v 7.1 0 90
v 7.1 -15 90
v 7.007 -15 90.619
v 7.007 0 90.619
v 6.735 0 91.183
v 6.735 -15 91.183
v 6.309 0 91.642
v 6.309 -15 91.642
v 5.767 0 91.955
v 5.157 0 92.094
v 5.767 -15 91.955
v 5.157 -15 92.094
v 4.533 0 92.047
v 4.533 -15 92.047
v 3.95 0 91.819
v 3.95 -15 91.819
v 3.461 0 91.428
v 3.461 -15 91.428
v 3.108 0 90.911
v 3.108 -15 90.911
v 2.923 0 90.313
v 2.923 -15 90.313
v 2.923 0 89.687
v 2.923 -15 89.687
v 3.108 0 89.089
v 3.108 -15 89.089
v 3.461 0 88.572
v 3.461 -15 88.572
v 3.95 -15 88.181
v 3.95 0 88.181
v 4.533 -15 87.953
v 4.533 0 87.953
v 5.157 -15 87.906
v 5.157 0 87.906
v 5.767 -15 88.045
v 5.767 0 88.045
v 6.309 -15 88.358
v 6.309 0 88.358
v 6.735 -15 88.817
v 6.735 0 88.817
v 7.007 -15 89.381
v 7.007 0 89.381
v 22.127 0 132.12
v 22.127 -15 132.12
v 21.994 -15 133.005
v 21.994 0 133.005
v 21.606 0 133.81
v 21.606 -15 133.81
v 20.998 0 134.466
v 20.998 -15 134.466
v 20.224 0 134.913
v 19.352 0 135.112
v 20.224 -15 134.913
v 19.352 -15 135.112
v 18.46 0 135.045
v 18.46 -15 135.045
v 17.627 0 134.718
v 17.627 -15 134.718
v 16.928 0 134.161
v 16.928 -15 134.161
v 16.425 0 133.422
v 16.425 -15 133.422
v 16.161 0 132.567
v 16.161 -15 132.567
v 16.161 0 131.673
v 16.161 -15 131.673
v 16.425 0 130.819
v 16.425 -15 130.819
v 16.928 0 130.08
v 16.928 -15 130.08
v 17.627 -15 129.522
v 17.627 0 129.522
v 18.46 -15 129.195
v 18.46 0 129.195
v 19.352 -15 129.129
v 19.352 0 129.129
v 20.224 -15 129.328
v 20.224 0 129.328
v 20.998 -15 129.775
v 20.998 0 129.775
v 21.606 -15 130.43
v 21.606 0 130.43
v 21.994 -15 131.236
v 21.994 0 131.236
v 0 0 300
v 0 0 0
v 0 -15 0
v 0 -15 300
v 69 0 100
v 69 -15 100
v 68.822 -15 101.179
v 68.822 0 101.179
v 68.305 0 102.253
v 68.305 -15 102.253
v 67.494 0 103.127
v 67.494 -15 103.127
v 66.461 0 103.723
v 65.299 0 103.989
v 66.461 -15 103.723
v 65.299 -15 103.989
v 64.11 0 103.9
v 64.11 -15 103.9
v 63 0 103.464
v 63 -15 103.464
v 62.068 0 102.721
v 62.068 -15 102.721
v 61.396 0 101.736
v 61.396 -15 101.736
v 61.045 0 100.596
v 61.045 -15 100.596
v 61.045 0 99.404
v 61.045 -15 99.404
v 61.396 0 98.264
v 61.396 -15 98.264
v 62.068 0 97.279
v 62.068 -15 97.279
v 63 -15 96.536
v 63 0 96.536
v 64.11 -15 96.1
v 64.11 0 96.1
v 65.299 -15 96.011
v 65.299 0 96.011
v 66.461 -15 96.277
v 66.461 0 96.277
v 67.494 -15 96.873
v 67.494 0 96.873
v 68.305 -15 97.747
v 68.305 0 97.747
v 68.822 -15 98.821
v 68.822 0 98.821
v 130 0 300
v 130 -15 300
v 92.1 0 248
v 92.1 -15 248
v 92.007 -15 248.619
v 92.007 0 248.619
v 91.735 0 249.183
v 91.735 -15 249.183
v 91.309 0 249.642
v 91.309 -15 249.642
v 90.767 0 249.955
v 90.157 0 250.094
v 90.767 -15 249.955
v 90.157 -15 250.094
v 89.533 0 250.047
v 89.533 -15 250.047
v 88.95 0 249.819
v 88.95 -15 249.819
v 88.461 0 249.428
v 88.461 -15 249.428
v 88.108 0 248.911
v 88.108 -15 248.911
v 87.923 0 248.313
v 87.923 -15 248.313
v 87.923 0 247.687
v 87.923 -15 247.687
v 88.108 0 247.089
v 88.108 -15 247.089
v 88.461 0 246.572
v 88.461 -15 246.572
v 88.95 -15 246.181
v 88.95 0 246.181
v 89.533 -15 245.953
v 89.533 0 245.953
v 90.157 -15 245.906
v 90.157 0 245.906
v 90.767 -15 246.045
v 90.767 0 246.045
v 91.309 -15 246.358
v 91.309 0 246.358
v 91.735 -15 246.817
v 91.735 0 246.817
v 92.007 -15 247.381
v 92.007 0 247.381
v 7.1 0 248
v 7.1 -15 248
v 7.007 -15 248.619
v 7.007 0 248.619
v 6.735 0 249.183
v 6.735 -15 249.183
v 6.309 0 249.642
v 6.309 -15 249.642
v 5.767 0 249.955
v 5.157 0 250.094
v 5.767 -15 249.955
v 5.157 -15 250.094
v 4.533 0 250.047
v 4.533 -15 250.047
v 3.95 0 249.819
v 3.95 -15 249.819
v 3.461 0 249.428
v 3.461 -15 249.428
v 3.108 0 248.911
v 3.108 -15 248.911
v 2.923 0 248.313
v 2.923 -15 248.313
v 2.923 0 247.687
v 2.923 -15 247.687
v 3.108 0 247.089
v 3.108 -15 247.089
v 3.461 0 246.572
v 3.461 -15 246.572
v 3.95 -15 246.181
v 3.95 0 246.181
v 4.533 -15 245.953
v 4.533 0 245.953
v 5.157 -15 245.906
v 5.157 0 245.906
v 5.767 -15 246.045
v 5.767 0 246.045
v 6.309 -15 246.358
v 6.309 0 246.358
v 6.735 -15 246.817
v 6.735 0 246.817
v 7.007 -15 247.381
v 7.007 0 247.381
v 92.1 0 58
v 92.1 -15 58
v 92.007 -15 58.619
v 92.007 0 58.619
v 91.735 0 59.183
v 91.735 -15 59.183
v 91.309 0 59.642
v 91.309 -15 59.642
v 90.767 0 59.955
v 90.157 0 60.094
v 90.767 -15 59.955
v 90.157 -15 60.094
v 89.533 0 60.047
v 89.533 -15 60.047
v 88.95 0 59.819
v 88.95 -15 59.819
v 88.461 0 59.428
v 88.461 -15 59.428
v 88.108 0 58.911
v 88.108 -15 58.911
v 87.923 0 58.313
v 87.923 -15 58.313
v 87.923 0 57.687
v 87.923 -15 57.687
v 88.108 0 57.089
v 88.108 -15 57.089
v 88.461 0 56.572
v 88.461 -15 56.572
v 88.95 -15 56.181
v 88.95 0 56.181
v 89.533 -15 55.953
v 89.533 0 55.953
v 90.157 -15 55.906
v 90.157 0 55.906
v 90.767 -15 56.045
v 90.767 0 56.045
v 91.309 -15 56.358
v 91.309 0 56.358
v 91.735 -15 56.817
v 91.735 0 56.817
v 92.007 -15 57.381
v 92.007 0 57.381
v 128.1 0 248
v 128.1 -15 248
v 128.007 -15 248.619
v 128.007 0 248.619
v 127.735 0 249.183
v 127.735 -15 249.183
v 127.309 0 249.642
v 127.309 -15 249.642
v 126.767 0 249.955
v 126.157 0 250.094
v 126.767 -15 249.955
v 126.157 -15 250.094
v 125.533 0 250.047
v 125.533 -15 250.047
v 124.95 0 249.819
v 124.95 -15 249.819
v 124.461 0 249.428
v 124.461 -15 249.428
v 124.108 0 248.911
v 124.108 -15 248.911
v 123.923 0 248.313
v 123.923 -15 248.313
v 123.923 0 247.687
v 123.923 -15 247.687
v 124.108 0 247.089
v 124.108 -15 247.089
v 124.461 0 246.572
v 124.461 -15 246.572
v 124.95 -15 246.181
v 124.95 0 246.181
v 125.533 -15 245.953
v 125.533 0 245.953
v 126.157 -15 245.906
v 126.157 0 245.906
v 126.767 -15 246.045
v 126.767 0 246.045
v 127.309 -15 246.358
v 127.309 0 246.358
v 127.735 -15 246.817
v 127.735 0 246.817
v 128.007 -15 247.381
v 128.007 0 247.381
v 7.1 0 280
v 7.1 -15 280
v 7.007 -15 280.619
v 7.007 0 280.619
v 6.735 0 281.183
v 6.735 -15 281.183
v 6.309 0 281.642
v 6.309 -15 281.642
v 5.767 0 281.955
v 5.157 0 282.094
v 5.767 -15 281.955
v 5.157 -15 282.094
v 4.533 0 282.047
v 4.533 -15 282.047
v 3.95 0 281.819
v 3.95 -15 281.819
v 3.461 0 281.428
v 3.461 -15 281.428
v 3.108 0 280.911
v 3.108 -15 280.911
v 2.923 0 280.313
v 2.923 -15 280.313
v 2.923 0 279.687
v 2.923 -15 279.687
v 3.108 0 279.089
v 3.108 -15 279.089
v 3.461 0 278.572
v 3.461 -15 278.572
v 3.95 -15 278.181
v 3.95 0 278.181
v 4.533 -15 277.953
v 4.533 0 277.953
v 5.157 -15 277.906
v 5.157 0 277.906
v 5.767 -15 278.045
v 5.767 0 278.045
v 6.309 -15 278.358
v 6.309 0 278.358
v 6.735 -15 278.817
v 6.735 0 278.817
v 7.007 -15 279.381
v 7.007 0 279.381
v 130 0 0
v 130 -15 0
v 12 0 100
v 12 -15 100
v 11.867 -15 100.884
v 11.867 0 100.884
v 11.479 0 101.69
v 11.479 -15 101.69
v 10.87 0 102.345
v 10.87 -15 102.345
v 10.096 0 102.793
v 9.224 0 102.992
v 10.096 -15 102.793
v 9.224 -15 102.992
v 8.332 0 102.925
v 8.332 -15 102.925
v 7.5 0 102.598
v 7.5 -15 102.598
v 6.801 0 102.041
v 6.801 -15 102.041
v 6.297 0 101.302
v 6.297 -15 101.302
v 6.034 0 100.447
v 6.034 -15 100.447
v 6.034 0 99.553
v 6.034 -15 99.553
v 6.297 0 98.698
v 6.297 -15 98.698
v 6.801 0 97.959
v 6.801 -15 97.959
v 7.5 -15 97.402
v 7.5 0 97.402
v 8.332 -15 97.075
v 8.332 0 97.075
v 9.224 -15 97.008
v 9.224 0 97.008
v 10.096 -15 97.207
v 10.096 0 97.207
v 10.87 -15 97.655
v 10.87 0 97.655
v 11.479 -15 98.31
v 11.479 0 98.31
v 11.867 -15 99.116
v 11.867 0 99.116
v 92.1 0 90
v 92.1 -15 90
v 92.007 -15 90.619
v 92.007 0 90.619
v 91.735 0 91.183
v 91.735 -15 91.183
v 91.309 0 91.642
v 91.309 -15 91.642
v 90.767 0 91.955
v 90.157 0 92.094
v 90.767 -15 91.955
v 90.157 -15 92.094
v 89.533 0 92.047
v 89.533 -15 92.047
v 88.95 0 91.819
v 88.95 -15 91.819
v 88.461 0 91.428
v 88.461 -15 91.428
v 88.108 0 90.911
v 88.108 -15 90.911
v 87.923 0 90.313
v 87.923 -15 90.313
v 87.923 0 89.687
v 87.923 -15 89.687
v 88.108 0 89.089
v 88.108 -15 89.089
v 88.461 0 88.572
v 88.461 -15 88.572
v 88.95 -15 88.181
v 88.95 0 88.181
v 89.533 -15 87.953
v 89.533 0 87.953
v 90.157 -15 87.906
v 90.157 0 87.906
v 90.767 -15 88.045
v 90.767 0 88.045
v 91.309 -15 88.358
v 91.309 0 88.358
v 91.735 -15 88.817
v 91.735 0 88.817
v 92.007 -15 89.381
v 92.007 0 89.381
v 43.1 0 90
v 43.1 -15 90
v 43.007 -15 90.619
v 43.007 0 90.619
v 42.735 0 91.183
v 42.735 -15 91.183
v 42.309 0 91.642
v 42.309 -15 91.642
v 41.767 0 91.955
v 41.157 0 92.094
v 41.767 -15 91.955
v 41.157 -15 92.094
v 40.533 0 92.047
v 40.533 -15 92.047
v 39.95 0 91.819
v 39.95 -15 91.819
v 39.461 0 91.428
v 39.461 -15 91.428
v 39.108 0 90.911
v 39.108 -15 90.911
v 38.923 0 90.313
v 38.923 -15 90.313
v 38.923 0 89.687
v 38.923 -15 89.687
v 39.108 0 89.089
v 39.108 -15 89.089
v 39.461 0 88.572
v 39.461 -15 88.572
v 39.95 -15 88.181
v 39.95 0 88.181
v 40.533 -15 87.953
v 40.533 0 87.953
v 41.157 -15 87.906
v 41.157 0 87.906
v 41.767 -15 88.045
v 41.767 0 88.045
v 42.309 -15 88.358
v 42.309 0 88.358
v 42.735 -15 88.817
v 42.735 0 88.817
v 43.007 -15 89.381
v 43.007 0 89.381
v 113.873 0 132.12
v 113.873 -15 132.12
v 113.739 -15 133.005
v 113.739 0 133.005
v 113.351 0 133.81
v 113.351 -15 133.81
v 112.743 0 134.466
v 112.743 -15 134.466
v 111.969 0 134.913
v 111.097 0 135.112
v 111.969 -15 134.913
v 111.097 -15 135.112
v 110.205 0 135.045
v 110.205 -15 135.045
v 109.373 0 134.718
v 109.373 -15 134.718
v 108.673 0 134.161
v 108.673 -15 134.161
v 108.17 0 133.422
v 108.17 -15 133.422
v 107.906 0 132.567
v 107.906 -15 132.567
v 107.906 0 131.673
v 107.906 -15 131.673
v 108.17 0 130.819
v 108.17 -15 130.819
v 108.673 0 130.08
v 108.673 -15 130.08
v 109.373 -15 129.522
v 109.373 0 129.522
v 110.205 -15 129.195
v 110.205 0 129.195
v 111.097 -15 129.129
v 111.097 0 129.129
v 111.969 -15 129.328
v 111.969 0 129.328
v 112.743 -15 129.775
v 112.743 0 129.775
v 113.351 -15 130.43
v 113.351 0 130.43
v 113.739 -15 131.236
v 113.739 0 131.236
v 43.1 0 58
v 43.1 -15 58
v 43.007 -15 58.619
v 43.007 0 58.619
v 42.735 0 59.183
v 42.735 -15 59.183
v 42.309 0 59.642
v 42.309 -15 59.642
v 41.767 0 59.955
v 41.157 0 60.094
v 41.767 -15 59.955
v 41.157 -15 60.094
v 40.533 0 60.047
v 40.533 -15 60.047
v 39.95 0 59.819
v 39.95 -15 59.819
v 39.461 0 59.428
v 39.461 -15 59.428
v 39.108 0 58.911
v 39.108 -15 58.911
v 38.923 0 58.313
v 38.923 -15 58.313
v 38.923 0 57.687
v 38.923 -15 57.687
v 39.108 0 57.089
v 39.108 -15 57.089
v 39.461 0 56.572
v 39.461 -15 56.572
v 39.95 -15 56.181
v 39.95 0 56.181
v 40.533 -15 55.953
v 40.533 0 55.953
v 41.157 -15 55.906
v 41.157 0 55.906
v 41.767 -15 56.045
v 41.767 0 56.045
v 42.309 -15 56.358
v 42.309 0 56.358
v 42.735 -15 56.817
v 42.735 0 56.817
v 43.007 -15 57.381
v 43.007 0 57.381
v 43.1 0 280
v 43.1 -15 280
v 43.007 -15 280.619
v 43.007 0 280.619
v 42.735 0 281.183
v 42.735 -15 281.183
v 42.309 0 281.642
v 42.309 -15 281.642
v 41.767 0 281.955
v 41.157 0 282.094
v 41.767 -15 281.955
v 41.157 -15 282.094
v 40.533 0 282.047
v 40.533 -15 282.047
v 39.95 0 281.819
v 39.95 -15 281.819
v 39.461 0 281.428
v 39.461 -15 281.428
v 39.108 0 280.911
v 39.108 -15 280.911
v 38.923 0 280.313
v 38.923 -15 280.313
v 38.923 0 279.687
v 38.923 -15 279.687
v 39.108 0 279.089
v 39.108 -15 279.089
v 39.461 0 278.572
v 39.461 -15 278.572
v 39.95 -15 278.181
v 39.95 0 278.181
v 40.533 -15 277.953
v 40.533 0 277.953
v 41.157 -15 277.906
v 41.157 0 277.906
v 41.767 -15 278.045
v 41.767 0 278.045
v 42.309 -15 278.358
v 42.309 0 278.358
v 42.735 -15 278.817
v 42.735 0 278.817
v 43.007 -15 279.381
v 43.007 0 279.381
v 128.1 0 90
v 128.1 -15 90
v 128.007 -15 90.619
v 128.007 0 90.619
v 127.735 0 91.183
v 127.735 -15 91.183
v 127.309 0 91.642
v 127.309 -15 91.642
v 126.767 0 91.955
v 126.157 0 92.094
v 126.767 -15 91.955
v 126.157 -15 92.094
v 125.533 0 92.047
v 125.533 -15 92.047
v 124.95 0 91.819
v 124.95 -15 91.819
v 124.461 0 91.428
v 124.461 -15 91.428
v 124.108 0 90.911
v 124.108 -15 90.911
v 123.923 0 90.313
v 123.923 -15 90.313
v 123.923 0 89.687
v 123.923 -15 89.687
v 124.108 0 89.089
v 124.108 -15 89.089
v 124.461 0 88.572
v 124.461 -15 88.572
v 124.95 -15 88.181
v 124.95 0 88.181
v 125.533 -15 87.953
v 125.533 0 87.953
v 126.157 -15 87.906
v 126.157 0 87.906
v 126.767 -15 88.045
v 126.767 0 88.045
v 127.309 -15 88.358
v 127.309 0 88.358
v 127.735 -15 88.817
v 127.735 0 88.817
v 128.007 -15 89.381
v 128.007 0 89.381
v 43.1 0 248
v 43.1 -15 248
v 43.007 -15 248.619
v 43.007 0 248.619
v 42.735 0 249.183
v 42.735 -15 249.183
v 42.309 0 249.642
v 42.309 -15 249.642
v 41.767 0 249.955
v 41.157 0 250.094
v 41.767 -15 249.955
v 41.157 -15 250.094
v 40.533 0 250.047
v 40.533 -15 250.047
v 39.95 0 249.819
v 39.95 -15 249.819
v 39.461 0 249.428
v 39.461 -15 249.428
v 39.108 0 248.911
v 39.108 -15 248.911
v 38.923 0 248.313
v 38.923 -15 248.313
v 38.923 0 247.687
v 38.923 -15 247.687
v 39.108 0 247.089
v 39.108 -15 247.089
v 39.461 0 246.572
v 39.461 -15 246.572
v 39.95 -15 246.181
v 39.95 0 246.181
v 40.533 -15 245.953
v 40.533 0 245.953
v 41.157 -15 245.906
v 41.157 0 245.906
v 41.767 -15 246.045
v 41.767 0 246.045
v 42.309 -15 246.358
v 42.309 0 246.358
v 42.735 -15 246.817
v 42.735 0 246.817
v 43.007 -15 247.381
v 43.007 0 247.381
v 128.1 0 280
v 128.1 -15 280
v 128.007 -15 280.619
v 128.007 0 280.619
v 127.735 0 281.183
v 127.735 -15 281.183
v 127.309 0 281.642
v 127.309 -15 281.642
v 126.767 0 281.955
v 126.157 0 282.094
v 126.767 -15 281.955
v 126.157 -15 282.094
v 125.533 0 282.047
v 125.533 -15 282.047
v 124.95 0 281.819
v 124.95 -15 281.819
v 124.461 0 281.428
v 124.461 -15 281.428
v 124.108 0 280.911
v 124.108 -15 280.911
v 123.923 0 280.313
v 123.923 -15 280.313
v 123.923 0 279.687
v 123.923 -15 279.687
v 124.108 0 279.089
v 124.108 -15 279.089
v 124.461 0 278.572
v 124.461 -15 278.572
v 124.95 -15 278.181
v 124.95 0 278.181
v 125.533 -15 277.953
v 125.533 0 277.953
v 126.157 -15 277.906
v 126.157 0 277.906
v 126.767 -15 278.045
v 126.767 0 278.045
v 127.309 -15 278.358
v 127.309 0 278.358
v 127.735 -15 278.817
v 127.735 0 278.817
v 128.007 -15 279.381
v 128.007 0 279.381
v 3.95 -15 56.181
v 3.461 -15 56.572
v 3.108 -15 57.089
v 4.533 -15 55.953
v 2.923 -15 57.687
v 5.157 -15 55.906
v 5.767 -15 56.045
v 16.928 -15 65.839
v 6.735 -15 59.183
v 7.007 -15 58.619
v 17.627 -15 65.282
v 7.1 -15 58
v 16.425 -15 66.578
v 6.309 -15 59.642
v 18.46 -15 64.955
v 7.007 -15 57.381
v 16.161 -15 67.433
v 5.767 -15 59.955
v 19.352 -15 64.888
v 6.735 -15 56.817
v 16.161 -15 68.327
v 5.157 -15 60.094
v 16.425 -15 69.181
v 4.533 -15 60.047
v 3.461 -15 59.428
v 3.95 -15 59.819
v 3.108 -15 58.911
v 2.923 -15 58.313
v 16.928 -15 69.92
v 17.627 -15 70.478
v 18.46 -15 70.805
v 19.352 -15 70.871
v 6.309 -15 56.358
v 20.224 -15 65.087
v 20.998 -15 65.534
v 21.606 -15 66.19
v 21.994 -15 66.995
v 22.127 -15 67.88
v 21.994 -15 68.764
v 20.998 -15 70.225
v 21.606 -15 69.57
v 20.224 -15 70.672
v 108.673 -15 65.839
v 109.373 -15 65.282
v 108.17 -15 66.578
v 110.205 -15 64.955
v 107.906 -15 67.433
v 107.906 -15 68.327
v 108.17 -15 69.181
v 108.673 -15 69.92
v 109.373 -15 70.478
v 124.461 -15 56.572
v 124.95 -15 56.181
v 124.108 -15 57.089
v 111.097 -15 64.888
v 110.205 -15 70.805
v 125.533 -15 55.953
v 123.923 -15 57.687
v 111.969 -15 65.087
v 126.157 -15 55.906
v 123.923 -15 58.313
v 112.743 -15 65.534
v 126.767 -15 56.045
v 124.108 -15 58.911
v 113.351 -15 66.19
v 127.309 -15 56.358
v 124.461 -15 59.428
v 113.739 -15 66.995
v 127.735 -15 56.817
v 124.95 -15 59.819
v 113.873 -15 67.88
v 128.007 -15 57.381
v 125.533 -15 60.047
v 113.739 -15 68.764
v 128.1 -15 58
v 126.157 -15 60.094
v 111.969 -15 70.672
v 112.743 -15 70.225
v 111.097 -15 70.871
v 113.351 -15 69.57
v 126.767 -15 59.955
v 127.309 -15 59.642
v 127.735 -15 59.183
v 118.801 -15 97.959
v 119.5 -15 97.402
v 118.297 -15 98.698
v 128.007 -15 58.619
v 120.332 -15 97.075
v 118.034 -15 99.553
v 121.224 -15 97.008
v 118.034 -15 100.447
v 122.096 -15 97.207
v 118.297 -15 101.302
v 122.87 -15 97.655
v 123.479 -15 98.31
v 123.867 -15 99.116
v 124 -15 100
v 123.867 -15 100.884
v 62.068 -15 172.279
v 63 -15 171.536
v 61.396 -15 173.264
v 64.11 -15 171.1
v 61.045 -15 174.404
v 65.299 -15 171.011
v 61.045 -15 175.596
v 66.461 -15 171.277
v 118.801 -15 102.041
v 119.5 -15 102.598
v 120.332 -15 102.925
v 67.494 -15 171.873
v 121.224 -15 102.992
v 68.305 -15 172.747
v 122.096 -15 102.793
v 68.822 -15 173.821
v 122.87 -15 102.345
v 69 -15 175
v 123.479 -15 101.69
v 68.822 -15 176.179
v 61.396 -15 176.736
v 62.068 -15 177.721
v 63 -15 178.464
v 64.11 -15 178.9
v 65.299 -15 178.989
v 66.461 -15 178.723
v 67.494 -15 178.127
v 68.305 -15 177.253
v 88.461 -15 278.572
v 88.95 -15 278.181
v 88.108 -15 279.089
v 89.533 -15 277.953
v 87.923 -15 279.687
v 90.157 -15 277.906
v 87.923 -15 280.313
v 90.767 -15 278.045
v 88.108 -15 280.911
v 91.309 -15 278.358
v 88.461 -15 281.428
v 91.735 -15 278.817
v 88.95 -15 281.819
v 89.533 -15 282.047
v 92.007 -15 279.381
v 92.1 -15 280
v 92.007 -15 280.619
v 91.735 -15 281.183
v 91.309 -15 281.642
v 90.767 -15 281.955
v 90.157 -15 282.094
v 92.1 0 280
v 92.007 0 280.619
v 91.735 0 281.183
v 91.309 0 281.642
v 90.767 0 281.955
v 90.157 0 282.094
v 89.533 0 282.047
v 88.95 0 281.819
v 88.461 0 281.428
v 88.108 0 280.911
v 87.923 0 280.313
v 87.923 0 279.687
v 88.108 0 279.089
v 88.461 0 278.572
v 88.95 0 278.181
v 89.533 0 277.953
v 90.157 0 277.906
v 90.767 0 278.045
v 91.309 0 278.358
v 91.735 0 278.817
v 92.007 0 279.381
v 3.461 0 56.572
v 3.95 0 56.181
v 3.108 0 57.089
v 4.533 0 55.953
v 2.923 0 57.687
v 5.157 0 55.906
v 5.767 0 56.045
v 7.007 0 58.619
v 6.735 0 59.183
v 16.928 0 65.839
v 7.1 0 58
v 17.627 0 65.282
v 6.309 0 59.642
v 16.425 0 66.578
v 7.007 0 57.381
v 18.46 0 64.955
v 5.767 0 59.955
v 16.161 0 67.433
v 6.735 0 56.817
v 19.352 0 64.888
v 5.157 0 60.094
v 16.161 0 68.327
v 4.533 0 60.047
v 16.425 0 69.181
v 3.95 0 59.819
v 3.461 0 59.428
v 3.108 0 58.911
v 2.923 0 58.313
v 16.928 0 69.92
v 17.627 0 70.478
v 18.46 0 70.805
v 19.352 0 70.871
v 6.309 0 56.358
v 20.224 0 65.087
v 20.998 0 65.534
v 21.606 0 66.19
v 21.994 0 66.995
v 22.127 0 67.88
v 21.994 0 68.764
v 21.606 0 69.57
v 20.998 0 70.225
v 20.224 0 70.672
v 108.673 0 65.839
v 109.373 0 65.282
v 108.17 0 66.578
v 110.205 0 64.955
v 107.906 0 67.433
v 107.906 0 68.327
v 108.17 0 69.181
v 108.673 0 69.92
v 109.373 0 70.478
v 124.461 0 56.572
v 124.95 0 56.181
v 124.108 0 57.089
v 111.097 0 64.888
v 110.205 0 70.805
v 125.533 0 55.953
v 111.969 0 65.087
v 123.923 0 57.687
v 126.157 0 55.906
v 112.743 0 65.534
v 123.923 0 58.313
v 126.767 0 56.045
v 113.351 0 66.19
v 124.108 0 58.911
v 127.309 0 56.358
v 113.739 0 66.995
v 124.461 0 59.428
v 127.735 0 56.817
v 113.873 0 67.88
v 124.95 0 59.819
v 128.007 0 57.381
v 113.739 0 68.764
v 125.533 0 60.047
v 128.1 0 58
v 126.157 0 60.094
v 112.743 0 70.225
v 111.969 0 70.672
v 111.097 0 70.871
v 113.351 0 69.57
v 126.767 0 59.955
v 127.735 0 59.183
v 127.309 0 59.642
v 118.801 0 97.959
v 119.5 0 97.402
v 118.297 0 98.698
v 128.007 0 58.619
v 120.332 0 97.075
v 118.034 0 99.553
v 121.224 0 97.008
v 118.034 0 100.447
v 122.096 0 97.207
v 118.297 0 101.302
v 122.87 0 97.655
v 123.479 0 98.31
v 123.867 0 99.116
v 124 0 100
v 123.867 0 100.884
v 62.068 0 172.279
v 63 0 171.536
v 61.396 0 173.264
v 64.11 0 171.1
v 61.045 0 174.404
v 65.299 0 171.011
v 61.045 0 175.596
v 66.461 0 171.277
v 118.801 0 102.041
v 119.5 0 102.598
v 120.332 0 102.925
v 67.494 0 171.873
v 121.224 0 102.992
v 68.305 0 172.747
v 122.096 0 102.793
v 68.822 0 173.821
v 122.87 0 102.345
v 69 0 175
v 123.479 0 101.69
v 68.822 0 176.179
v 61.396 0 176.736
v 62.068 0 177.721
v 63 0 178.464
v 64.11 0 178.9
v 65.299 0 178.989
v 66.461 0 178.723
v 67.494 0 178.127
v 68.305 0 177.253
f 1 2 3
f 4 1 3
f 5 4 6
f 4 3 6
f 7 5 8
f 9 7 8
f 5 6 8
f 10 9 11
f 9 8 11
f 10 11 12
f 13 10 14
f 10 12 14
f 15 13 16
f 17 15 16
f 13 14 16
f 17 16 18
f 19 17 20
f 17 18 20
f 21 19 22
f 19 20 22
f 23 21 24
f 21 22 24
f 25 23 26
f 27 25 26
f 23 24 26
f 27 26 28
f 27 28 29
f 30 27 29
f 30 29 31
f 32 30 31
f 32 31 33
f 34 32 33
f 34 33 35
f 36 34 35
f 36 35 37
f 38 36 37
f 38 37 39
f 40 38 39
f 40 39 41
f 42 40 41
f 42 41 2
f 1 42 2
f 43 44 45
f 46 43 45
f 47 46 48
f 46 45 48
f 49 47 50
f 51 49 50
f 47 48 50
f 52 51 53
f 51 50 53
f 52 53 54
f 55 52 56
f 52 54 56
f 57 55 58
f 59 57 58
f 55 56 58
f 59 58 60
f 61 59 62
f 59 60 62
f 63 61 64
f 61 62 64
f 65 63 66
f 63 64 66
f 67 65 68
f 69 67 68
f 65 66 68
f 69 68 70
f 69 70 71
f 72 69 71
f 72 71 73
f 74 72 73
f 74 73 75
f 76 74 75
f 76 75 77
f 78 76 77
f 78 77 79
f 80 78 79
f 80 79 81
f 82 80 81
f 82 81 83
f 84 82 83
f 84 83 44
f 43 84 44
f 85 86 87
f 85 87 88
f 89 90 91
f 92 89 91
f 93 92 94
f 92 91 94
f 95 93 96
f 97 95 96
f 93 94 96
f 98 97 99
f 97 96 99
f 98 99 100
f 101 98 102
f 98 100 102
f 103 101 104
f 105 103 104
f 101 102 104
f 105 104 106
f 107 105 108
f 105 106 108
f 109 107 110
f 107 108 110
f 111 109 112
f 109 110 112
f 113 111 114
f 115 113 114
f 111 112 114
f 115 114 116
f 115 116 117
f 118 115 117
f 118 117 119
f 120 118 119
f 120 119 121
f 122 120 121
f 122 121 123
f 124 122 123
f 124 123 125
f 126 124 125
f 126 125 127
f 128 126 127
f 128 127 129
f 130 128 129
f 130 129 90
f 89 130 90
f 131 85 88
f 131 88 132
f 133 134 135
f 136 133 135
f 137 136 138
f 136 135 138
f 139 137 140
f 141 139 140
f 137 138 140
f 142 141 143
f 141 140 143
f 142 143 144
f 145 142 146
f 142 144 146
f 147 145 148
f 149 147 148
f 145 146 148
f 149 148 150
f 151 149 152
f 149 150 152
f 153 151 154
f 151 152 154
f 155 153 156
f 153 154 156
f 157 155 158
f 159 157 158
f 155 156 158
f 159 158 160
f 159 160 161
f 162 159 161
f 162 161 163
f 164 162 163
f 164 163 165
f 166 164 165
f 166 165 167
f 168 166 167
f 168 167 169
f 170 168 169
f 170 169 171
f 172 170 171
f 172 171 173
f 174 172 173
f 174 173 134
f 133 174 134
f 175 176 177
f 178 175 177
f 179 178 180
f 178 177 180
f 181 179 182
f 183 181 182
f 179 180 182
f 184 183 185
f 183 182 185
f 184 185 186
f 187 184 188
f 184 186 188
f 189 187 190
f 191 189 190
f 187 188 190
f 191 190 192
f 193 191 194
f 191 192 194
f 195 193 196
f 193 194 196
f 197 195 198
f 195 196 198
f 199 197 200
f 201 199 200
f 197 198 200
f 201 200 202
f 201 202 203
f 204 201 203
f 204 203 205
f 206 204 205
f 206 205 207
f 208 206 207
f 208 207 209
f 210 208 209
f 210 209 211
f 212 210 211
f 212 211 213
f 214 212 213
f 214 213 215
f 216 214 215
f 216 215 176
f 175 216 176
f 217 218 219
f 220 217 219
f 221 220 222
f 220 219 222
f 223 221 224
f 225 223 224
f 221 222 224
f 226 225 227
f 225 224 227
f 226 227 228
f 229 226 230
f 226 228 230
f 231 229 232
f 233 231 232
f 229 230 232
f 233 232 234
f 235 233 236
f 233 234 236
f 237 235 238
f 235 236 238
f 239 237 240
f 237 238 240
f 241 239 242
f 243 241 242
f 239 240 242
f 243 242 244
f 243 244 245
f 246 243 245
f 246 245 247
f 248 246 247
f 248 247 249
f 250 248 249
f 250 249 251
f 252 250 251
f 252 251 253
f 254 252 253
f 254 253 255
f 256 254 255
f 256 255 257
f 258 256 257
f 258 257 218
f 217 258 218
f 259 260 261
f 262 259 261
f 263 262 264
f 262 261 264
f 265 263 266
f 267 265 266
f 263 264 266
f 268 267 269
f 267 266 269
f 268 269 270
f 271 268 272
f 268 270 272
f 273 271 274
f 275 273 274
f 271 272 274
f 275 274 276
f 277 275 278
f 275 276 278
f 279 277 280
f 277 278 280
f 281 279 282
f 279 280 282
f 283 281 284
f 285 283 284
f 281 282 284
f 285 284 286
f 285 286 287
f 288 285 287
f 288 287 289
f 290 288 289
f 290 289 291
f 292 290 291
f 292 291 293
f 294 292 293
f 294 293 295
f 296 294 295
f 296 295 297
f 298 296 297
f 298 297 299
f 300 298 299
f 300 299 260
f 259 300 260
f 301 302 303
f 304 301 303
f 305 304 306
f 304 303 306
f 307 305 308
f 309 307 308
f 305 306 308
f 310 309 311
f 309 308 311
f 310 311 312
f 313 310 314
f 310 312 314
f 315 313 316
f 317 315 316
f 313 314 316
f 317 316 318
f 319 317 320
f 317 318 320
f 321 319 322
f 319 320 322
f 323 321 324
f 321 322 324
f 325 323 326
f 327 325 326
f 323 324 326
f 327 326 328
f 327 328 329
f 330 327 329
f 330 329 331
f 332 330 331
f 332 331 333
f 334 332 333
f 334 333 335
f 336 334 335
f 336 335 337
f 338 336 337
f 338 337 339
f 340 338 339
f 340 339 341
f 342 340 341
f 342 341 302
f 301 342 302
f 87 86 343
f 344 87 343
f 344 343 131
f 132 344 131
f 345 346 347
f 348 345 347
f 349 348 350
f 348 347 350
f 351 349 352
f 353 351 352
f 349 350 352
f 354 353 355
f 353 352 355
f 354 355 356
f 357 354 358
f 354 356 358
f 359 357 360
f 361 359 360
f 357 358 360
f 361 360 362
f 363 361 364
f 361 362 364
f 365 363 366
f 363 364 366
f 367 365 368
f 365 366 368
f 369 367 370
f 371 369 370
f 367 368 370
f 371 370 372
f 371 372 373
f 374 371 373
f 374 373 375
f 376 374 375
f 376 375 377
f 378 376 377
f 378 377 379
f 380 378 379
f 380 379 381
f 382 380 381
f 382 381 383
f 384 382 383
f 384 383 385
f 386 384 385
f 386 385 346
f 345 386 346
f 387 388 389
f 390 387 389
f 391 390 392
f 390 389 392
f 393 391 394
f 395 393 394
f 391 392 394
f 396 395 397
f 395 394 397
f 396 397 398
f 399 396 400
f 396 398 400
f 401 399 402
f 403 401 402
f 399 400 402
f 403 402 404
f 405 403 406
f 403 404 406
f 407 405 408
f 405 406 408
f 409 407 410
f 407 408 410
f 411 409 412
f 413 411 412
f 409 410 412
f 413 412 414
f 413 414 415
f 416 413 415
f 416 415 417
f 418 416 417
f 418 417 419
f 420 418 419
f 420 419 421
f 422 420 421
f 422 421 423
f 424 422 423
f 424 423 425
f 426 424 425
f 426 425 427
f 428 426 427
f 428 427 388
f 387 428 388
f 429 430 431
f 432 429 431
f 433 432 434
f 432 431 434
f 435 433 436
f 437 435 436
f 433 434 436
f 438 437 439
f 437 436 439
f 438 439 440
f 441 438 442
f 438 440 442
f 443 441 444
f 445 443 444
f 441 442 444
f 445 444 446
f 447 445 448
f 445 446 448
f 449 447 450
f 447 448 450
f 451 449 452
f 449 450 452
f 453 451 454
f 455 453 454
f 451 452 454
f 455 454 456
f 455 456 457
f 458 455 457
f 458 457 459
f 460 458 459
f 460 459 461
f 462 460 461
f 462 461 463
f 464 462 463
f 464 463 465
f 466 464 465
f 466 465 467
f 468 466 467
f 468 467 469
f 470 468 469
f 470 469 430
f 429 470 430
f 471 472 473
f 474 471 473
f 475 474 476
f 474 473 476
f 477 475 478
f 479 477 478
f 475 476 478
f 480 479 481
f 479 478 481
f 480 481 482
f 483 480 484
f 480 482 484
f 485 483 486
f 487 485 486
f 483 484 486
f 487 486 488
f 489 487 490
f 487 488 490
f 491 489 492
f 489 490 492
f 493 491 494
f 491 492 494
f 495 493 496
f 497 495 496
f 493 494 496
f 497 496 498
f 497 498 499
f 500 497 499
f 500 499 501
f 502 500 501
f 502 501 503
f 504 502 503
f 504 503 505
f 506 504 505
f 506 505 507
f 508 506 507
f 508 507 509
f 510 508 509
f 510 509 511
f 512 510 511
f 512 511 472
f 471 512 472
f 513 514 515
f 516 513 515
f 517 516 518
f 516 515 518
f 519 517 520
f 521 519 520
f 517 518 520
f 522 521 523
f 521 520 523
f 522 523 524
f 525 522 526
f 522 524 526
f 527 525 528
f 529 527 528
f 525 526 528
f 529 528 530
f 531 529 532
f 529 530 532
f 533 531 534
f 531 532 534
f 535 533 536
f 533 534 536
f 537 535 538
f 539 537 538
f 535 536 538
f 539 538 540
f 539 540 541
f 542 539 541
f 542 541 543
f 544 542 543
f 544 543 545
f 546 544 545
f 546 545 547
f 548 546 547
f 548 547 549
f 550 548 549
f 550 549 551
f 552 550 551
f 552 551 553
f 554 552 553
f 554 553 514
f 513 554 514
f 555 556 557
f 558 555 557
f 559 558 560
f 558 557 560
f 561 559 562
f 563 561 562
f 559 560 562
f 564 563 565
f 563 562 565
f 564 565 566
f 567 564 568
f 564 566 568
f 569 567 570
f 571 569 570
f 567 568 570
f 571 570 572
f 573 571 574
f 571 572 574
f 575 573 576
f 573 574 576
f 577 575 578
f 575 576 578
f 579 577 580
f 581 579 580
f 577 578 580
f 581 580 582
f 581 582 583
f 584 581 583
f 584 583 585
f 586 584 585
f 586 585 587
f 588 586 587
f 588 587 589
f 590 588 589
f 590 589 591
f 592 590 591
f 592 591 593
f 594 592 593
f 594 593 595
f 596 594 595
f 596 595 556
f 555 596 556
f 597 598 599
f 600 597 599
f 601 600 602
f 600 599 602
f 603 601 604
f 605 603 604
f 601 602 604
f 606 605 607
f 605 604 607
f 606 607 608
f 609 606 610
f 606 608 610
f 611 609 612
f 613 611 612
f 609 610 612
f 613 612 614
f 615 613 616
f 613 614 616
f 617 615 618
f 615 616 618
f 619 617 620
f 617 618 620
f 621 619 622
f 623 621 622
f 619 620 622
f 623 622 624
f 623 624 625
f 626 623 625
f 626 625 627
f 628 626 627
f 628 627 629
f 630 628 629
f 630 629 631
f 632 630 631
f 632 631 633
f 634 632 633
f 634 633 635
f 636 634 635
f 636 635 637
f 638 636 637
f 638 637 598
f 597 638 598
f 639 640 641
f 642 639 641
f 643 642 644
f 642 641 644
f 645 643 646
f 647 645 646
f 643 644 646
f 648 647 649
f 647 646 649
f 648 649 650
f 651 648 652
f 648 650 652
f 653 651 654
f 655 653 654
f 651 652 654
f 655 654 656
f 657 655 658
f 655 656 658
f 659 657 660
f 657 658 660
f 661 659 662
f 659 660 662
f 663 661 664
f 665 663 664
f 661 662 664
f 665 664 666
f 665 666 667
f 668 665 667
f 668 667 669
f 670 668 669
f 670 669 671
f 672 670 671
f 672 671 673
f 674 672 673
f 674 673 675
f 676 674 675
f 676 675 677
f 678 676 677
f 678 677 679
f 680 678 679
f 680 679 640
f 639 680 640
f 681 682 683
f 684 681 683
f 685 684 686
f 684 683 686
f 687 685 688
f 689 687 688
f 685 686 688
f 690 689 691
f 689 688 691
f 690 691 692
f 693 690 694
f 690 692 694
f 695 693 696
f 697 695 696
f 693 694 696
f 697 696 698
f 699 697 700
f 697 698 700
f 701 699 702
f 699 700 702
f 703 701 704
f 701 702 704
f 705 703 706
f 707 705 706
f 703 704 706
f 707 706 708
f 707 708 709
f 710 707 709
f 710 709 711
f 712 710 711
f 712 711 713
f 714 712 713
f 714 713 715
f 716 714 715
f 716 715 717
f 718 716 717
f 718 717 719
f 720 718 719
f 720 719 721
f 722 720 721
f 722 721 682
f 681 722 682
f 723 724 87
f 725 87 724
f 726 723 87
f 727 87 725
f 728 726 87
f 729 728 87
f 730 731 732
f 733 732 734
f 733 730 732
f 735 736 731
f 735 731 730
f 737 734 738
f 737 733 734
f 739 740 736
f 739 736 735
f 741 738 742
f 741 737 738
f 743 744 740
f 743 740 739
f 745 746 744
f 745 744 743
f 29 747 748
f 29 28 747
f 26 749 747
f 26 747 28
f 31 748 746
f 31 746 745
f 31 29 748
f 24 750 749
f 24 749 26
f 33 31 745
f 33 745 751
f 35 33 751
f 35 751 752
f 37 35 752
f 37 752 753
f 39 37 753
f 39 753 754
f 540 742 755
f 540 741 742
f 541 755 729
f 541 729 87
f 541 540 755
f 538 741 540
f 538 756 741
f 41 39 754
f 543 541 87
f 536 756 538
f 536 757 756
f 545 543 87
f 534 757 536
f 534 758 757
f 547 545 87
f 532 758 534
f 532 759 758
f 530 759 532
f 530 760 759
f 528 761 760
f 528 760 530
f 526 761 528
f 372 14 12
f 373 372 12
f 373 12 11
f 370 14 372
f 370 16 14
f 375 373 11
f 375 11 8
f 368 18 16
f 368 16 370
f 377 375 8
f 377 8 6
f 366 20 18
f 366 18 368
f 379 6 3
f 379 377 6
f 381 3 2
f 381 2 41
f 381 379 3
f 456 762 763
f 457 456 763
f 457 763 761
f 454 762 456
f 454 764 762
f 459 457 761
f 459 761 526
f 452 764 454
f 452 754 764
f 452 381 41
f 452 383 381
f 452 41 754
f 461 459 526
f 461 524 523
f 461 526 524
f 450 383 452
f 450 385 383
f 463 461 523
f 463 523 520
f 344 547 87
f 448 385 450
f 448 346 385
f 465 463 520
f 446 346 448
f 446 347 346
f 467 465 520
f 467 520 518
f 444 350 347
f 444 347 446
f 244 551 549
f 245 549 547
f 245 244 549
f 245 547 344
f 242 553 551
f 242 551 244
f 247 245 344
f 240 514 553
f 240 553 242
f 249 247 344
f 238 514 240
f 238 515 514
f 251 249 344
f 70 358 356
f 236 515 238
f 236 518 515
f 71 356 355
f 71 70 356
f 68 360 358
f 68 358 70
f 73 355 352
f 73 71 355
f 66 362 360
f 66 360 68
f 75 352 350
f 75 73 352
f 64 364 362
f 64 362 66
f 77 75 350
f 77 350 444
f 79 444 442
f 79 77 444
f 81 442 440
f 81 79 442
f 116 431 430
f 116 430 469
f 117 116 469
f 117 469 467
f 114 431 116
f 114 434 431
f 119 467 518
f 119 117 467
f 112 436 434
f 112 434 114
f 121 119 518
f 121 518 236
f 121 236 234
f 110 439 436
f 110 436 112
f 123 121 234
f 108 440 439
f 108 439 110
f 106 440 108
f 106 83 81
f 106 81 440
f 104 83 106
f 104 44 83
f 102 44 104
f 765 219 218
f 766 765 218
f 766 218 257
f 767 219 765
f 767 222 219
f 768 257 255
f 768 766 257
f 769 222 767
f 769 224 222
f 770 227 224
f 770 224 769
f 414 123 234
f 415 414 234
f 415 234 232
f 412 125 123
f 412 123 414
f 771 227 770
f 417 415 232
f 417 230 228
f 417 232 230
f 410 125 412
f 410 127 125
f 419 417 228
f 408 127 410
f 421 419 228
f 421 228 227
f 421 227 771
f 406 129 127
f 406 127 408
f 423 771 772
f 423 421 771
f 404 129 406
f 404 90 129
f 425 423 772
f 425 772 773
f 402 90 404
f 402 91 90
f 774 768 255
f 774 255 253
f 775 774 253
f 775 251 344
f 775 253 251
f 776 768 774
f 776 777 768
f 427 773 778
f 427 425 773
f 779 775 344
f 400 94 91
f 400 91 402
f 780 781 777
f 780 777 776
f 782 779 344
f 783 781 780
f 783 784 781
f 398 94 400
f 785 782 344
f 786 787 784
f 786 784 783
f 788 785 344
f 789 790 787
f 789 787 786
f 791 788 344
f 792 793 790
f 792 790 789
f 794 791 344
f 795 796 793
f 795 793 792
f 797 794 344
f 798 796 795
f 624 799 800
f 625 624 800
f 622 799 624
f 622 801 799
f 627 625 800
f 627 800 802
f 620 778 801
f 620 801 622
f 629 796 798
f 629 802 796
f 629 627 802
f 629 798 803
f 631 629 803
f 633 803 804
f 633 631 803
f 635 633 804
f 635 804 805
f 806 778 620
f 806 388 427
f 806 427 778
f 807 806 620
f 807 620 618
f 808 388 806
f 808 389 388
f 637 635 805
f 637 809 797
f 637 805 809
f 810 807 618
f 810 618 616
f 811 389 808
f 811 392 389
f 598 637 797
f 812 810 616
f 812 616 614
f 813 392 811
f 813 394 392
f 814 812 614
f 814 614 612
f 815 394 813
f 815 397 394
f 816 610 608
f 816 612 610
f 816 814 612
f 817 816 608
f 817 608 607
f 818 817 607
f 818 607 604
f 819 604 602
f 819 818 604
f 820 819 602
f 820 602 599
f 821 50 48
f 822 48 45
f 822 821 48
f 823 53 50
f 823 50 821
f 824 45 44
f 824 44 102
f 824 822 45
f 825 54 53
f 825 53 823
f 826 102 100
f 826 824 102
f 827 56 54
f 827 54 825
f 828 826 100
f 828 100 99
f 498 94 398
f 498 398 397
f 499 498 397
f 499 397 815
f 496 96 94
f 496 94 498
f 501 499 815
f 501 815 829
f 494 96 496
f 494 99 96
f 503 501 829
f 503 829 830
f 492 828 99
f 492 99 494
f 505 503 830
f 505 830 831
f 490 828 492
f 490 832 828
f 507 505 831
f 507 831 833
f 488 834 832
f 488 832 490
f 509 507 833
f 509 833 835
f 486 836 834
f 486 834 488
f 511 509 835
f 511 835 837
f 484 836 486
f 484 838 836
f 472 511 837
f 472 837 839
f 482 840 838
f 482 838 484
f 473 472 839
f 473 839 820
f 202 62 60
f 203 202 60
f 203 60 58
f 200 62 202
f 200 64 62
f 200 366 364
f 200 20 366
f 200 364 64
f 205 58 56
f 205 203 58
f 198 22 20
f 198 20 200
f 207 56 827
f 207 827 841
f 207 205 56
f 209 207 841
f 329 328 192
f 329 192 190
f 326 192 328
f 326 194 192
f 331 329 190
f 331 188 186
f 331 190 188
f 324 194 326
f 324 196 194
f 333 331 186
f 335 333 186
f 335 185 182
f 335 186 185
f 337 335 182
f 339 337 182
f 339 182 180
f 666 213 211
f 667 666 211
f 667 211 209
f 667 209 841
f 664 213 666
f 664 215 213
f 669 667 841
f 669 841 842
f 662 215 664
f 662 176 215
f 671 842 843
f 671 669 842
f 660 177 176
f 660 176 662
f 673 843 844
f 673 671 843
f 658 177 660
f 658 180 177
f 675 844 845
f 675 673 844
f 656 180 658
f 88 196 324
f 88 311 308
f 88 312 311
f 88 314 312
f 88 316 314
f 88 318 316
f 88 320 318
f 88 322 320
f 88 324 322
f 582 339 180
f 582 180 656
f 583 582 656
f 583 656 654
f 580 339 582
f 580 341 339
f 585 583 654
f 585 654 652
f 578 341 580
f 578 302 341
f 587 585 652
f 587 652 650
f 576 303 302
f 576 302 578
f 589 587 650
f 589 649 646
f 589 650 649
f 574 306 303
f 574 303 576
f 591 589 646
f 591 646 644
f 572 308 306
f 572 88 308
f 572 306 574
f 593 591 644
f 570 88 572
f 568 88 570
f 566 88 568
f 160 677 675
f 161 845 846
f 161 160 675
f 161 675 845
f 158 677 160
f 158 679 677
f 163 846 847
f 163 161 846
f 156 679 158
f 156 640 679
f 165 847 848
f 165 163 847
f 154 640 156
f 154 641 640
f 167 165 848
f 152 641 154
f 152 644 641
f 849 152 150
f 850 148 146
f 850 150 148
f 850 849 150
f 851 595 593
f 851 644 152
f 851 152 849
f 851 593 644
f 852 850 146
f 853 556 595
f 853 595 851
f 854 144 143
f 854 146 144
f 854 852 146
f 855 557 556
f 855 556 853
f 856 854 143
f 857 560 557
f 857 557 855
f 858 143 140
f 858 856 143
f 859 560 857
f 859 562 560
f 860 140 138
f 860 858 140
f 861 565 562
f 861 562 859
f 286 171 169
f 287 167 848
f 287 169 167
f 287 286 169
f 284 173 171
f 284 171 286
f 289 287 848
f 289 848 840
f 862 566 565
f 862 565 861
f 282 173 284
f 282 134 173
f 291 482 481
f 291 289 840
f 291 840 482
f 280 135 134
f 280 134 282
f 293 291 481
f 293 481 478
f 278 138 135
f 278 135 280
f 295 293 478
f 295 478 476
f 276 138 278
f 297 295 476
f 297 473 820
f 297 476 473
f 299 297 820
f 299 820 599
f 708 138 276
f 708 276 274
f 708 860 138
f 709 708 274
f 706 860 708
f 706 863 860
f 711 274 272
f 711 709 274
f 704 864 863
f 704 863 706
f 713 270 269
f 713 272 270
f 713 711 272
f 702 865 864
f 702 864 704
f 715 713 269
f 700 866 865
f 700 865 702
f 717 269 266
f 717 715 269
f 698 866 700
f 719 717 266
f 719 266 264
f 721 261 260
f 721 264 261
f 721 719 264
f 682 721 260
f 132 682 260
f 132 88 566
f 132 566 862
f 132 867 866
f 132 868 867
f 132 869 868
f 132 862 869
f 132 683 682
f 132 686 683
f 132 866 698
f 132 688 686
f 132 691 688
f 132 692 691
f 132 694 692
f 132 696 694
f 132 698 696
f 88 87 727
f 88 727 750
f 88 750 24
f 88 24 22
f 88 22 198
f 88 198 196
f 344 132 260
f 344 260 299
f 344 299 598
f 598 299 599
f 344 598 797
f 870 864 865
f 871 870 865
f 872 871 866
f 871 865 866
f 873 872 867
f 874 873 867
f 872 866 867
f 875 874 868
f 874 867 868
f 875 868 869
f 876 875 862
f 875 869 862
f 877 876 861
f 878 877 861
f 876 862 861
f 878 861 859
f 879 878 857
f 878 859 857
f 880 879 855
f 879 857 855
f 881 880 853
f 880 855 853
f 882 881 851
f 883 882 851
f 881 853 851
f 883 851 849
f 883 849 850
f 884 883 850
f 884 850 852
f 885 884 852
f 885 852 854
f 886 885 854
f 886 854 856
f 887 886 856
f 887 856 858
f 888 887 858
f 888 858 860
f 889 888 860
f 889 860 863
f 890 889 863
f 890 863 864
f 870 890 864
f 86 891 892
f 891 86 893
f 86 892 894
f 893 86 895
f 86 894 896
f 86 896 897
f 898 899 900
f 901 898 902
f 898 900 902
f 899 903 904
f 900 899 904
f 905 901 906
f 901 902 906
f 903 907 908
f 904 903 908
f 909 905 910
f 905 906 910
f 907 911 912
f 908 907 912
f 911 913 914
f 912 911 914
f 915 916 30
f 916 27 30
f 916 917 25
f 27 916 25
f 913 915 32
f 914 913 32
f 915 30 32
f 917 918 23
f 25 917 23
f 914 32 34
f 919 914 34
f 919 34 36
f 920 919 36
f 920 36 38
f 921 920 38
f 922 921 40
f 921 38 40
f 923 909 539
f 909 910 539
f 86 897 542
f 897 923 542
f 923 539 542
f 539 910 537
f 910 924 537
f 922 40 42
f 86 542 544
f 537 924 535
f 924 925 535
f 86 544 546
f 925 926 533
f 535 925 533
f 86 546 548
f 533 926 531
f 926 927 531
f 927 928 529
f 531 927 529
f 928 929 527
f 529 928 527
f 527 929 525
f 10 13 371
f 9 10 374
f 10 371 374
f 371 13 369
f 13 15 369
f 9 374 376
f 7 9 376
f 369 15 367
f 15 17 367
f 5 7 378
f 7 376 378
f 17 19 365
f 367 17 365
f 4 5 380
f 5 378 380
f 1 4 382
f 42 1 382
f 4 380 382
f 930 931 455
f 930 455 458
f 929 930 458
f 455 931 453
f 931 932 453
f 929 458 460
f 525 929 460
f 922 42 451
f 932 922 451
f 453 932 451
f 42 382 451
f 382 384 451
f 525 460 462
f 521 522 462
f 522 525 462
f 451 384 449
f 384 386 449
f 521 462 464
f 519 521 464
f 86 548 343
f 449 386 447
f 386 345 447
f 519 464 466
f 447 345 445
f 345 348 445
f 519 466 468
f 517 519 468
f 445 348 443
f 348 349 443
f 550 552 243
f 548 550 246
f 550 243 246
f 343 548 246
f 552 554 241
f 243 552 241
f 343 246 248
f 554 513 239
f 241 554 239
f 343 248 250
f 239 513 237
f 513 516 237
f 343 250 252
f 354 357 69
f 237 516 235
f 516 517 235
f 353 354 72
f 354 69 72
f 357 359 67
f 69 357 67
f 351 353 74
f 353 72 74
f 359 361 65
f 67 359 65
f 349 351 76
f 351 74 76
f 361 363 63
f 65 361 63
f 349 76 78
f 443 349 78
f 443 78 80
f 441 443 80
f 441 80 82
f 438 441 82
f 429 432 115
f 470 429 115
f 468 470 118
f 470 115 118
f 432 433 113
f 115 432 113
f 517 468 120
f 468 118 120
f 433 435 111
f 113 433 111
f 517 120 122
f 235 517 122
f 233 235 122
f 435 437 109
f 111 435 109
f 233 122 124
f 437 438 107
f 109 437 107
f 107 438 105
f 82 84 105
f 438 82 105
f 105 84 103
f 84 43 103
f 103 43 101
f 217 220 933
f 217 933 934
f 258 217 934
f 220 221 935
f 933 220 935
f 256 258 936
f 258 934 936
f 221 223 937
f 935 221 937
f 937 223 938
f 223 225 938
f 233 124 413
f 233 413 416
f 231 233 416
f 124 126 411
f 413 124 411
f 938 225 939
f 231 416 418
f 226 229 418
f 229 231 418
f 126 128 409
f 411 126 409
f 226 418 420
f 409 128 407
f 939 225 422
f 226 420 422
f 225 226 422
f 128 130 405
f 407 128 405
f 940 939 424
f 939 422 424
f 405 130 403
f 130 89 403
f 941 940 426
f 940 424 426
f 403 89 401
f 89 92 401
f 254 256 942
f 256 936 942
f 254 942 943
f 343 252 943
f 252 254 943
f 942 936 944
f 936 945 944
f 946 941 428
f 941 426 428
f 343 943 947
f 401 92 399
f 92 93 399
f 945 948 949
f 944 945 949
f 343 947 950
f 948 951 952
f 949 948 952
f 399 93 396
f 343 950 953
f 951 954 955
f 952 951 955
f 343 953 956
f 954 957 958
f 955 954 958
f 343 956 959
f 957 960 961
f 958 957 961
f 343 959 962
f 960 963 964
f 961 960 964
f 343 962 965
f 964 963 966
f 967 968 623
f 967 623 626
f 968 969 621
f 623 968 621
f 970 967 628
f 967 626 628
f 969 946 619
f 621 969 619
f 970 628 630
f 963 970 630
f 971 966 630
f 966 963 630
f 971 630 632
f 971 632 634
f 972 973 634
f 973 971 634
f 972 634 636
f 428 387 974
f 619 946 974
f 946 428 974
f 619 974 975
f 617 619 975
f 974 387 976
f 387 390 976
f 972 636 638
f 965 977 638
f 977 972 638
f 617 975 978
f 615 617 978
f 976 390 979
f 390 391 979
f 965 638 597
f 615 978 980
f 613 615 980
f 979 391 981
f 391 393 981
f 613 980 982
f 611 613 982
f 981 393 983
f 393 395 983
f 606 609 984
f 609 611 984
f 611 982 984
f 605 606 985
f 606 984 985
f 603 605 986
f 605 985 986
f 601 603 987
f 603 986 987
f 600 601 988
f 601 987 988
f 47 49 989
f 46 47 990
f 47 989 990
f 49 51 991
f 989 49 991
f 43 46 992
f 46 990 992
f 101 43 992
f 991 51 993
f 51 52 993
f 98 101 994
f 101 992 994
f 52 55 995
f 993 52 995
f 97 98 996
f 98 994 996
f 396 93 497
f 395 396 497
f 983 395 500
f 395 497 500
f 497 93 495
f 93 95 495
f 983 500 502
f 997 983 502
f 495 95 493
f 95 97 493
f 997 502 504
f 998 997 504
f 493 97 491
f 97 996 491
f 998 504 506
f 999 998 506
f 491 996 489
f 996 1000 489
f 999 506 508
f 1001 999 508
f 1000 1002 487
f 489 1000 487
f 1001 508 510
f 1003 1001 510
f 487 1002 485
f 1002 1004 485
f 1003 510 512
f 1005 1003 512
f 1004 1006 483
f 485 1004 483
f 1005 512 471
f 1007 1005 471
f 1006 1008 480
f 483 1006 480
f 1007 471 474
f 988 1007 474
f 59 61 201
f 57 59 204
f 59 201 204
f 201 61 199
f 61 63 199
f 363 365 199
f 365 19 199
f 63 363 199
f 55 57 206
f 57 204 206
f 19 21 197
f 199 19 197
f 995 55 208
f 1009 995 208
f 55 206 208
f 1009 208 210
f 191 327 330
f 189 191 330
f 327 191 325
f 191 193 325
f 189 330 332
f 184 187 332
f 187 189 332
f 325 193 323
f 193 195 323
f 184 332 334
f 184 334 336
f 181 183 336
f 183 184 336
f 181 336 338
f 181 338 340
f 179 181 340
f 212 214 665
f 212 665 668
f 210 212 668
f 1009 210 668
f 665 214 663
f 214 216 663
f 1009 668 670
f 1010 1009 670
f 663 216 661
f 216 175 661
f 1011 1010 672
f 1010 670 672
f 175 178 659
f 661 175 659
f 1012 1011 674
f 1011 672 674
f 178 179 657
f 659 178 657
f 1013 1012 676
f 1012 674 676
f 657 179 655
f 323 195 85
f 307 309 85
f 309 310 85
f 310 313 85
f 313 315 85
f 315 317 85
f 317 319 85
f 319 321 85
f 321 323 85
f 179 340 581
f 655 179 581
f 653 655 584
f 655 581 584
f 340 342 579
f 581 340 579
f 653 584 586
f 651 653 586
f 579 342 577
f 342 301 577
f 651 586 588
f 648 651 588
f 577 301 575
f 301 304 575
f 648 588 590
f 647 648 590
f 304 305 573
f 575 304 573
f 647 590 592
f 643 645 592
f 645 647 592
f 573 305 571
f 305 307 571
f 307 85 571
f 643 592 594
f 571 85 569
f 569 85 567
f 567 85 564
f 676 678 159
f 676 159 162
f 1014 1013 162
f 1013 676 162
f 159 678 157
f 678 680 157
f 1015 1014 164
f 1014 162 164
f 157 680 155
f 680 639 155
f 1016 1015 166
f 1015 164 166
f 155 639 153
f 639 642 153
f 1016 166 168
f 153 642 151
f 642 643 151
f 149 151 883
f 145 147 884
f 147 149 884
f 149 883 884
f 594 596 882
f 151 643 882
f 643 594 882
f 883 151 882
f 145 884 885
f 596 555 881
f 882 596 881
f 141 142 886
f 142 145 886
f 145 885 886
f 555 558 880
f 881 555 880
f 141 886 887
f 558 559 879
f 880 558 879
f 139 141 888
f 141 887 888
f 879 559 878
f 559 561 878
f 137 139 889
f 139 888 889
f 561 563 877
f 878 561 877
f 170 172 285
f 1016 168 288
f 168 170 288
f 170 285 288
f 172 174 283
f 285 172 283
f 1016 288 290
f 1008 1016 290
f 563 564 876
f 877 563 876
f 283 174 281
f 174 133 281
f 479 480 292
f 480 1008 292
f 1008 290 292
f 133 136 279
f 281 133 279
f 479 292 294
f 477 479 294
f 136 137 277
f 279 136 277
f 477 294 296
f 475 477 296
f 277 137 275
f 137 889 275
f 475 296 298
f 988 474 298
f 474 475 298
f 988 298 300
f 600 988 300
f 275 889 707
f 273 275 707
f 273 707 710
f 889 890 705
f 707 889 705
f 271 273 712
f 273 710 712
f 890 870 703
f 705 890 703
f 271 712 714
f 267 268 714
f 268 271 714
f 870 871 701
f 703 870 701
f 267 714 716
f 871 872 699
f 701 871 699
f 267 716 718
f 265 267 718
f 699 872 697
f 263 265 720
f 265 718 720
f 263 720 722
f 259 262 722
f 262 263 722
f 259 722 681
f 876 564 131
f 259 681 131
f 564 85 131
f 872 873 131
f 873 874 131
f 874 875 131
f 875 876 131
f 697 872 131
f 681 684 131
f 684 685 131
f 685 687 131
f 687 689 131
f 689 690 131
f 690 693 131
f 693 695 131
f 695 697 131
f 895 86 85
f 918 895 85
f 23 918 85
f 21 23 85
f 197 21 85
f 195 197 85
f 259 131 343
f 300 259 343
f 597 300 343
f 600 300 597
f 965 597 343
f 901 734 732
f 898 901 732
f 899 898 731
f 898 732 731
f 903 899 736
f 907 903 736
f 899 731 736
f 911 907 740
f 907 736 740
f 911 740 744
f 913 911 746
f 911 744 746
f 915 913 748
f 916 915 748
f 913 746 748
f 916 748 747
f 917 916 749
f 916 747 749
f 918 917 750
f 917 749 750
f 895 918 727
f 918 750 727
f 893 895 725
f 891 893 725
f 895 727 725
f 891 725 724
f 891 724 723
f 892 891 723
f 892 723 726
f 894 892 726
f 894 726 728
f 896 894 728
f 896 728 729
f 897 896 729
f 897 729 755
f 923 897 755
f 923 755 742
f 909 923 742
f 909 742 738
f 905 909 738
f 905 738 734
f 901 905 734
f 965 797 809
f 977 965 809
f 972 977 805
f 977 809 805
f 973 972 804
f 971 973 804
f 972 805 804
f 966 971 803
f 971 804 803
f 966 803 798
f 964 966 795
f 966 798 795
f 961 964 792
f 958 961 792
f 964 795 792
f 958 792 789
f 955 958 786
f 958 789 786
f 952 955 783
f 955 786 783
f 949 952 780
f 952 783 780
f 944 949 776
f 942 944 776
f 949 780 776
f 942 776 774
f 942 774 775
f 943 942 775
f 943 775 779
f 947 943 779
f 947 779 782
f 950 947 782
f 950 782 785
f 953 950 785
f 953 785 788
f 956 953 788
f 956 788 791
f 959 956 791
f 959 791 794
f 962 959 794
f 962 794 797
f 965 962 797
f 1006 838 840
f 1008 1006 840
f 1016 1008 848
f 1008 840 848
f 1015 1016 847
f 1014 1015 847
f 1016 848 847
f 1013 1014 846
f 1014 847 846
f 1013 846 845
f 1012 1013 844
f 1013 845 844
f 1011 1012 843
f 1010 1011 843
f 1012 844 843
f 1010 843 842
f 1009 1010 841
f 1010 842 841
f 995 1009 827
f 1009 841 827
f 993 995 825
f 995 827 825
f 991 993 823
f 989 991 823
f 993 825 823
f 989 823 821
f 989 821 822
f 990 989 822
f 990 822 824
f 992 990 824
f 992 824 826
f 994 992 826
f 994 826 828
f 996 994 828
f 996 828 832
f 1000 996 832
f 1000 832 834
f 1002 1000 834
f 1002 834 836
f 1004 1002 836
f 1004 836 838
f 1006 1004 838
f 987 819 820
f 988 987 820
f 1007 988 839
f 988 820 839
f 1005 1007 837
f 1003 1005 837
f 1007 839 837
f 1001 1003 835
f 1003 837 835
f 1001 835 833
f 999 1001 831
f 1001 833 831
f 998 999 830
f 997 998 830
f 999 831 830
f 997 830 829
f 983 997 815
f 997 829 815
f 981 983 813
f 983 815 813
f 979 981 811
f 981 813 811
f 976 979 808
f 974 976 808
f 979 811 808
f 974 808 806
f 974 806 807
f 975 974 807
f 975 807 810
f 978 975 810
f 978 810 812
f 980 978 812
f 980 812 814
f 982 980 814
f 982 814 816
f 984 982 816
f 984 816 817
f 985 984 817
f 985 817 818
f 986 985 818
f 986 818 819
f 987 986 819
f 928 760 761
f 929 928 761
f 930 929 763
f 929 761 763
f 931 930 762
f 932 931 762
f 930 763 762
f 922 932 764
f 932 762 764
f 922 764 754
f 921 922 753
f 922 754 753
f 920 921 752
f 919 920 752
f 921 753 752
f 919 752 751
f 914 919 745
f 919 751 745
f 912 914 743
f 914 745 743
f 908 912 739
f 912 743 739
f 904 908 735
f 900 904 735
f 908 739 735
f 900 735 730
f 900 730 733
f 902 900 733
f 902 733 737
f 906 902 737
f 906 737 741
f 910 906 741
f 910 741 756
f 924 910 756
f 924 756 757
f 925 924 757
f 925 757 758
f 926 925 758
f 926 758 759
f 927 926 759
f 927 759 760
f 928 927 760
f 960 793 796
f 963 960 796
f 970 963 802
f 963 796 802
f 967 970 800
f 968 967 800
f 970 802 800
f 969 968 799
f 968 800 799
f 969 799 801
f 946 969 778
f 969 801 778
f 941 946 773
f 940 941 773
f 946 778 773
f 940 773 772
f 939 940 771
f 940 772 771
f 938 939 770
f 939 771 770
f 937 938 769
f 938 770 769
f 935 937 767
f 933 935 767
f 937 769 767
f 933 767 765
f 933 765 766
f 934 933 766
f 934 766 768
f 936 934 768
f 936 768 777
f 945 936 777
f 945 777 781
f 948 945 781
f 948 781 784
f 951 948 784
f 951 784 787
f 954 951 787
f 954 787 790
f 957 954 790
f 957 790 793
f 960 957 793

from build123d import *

# Parameters (mm, degrees)
SKETCH_W        = 130
SKETCH_H        = 300
PAD_DEPTH       = 15
SKETCH001_R     = 2.1
POCKET_DEPTH    = 15.001
SKETCH002_R     = 3
SKETCH002_R_2   = 4
POCKET001_DEPTH = 15.001


with BuildPart() as part:
    # Sketch → Pad (new body)
    with BuildSketch(Plane.XZ):
        with Locations((65, 150)):
            Rectangle(SKETCH_W, SKETCH_H)
    extrude(amount=PAD_DEPTH)

    # Sketch001 (on Face6 of Pad) → Pocket (cut, through all)
    with BuildSketch(Plane.XZ.offset(15)):
        with Locations((5, 280)):
            Circle(SKETCH001_R)
        with Locations((41, 280)):
            Circle(SKETCH001_R)
        with Locations((5, 248)):
            Circle(SKETCH001_R)
        with Locations((41, 248)):
            Circle(SKETCH001_R)
        with Locations((90, 280)):
            Circle(SKETCH001_R)
        with Locations((126, 280)):
            Circle(SKETCH001_R)
        with Locations((90, 248)):
            Circle(SKETCH001_R)
        with Locations((126, 248)):
            Circle(SKETCH001_R)
        with Locations((5, 90)):
            Circle(SKETCH001_R)
        with Locations((41, 90)):
            Circle(SKETCH001_R)
        with Locations((5, 58)):
            Circle(SKETCH001_R)
        with Locations((41, 58)):
            Circle(SKETCH001_R)
        with Locations((90, 90)):
            Circle(SKETCH001_R)
        with Locations((126, 90)):
            Circle(SKETCH001_R)
        with Locations((90, 58)):
            Circle(SKETCH001_R)
        with Locations((126, 58)):
            Circle(SKETCH001_R)
    extrude(amount=-POCKET_DEPTH, mode=Mode.SUBTRACT)

    # Sketch002 (on Face5 of Pocket) → Pocket001 (cut, through all)
    with BuildSketch(Plane.XZ.offset(15)):
        with Locations((9, 100)):
            Circle(SKETCH002_R)
        with Locations((121, 100)):
            Circle(SKETCH002_R)
        with Locations((65, 175)):
            Circle(SKETCH002_R_2)
        with Locations((65, 100)):
            Circle(SKETCH002_R_2)
        with Locations((19.127486, 132.12028)):
            Circle(SKETCH002_R)
        with Locations((110.872514, 67.87972)):
            Circle(SKETCH002_R)
        with Locations((19.127486, 67.87972)):
            Circle(SKETCH002_R)
        with Locations((110.872514, 132.12028)):
            Circle(SKETCH002_R)
    extrude(amount=-POCKET001_DEPTH, mode=Mode.SUBTRACT)


solid = part.part
